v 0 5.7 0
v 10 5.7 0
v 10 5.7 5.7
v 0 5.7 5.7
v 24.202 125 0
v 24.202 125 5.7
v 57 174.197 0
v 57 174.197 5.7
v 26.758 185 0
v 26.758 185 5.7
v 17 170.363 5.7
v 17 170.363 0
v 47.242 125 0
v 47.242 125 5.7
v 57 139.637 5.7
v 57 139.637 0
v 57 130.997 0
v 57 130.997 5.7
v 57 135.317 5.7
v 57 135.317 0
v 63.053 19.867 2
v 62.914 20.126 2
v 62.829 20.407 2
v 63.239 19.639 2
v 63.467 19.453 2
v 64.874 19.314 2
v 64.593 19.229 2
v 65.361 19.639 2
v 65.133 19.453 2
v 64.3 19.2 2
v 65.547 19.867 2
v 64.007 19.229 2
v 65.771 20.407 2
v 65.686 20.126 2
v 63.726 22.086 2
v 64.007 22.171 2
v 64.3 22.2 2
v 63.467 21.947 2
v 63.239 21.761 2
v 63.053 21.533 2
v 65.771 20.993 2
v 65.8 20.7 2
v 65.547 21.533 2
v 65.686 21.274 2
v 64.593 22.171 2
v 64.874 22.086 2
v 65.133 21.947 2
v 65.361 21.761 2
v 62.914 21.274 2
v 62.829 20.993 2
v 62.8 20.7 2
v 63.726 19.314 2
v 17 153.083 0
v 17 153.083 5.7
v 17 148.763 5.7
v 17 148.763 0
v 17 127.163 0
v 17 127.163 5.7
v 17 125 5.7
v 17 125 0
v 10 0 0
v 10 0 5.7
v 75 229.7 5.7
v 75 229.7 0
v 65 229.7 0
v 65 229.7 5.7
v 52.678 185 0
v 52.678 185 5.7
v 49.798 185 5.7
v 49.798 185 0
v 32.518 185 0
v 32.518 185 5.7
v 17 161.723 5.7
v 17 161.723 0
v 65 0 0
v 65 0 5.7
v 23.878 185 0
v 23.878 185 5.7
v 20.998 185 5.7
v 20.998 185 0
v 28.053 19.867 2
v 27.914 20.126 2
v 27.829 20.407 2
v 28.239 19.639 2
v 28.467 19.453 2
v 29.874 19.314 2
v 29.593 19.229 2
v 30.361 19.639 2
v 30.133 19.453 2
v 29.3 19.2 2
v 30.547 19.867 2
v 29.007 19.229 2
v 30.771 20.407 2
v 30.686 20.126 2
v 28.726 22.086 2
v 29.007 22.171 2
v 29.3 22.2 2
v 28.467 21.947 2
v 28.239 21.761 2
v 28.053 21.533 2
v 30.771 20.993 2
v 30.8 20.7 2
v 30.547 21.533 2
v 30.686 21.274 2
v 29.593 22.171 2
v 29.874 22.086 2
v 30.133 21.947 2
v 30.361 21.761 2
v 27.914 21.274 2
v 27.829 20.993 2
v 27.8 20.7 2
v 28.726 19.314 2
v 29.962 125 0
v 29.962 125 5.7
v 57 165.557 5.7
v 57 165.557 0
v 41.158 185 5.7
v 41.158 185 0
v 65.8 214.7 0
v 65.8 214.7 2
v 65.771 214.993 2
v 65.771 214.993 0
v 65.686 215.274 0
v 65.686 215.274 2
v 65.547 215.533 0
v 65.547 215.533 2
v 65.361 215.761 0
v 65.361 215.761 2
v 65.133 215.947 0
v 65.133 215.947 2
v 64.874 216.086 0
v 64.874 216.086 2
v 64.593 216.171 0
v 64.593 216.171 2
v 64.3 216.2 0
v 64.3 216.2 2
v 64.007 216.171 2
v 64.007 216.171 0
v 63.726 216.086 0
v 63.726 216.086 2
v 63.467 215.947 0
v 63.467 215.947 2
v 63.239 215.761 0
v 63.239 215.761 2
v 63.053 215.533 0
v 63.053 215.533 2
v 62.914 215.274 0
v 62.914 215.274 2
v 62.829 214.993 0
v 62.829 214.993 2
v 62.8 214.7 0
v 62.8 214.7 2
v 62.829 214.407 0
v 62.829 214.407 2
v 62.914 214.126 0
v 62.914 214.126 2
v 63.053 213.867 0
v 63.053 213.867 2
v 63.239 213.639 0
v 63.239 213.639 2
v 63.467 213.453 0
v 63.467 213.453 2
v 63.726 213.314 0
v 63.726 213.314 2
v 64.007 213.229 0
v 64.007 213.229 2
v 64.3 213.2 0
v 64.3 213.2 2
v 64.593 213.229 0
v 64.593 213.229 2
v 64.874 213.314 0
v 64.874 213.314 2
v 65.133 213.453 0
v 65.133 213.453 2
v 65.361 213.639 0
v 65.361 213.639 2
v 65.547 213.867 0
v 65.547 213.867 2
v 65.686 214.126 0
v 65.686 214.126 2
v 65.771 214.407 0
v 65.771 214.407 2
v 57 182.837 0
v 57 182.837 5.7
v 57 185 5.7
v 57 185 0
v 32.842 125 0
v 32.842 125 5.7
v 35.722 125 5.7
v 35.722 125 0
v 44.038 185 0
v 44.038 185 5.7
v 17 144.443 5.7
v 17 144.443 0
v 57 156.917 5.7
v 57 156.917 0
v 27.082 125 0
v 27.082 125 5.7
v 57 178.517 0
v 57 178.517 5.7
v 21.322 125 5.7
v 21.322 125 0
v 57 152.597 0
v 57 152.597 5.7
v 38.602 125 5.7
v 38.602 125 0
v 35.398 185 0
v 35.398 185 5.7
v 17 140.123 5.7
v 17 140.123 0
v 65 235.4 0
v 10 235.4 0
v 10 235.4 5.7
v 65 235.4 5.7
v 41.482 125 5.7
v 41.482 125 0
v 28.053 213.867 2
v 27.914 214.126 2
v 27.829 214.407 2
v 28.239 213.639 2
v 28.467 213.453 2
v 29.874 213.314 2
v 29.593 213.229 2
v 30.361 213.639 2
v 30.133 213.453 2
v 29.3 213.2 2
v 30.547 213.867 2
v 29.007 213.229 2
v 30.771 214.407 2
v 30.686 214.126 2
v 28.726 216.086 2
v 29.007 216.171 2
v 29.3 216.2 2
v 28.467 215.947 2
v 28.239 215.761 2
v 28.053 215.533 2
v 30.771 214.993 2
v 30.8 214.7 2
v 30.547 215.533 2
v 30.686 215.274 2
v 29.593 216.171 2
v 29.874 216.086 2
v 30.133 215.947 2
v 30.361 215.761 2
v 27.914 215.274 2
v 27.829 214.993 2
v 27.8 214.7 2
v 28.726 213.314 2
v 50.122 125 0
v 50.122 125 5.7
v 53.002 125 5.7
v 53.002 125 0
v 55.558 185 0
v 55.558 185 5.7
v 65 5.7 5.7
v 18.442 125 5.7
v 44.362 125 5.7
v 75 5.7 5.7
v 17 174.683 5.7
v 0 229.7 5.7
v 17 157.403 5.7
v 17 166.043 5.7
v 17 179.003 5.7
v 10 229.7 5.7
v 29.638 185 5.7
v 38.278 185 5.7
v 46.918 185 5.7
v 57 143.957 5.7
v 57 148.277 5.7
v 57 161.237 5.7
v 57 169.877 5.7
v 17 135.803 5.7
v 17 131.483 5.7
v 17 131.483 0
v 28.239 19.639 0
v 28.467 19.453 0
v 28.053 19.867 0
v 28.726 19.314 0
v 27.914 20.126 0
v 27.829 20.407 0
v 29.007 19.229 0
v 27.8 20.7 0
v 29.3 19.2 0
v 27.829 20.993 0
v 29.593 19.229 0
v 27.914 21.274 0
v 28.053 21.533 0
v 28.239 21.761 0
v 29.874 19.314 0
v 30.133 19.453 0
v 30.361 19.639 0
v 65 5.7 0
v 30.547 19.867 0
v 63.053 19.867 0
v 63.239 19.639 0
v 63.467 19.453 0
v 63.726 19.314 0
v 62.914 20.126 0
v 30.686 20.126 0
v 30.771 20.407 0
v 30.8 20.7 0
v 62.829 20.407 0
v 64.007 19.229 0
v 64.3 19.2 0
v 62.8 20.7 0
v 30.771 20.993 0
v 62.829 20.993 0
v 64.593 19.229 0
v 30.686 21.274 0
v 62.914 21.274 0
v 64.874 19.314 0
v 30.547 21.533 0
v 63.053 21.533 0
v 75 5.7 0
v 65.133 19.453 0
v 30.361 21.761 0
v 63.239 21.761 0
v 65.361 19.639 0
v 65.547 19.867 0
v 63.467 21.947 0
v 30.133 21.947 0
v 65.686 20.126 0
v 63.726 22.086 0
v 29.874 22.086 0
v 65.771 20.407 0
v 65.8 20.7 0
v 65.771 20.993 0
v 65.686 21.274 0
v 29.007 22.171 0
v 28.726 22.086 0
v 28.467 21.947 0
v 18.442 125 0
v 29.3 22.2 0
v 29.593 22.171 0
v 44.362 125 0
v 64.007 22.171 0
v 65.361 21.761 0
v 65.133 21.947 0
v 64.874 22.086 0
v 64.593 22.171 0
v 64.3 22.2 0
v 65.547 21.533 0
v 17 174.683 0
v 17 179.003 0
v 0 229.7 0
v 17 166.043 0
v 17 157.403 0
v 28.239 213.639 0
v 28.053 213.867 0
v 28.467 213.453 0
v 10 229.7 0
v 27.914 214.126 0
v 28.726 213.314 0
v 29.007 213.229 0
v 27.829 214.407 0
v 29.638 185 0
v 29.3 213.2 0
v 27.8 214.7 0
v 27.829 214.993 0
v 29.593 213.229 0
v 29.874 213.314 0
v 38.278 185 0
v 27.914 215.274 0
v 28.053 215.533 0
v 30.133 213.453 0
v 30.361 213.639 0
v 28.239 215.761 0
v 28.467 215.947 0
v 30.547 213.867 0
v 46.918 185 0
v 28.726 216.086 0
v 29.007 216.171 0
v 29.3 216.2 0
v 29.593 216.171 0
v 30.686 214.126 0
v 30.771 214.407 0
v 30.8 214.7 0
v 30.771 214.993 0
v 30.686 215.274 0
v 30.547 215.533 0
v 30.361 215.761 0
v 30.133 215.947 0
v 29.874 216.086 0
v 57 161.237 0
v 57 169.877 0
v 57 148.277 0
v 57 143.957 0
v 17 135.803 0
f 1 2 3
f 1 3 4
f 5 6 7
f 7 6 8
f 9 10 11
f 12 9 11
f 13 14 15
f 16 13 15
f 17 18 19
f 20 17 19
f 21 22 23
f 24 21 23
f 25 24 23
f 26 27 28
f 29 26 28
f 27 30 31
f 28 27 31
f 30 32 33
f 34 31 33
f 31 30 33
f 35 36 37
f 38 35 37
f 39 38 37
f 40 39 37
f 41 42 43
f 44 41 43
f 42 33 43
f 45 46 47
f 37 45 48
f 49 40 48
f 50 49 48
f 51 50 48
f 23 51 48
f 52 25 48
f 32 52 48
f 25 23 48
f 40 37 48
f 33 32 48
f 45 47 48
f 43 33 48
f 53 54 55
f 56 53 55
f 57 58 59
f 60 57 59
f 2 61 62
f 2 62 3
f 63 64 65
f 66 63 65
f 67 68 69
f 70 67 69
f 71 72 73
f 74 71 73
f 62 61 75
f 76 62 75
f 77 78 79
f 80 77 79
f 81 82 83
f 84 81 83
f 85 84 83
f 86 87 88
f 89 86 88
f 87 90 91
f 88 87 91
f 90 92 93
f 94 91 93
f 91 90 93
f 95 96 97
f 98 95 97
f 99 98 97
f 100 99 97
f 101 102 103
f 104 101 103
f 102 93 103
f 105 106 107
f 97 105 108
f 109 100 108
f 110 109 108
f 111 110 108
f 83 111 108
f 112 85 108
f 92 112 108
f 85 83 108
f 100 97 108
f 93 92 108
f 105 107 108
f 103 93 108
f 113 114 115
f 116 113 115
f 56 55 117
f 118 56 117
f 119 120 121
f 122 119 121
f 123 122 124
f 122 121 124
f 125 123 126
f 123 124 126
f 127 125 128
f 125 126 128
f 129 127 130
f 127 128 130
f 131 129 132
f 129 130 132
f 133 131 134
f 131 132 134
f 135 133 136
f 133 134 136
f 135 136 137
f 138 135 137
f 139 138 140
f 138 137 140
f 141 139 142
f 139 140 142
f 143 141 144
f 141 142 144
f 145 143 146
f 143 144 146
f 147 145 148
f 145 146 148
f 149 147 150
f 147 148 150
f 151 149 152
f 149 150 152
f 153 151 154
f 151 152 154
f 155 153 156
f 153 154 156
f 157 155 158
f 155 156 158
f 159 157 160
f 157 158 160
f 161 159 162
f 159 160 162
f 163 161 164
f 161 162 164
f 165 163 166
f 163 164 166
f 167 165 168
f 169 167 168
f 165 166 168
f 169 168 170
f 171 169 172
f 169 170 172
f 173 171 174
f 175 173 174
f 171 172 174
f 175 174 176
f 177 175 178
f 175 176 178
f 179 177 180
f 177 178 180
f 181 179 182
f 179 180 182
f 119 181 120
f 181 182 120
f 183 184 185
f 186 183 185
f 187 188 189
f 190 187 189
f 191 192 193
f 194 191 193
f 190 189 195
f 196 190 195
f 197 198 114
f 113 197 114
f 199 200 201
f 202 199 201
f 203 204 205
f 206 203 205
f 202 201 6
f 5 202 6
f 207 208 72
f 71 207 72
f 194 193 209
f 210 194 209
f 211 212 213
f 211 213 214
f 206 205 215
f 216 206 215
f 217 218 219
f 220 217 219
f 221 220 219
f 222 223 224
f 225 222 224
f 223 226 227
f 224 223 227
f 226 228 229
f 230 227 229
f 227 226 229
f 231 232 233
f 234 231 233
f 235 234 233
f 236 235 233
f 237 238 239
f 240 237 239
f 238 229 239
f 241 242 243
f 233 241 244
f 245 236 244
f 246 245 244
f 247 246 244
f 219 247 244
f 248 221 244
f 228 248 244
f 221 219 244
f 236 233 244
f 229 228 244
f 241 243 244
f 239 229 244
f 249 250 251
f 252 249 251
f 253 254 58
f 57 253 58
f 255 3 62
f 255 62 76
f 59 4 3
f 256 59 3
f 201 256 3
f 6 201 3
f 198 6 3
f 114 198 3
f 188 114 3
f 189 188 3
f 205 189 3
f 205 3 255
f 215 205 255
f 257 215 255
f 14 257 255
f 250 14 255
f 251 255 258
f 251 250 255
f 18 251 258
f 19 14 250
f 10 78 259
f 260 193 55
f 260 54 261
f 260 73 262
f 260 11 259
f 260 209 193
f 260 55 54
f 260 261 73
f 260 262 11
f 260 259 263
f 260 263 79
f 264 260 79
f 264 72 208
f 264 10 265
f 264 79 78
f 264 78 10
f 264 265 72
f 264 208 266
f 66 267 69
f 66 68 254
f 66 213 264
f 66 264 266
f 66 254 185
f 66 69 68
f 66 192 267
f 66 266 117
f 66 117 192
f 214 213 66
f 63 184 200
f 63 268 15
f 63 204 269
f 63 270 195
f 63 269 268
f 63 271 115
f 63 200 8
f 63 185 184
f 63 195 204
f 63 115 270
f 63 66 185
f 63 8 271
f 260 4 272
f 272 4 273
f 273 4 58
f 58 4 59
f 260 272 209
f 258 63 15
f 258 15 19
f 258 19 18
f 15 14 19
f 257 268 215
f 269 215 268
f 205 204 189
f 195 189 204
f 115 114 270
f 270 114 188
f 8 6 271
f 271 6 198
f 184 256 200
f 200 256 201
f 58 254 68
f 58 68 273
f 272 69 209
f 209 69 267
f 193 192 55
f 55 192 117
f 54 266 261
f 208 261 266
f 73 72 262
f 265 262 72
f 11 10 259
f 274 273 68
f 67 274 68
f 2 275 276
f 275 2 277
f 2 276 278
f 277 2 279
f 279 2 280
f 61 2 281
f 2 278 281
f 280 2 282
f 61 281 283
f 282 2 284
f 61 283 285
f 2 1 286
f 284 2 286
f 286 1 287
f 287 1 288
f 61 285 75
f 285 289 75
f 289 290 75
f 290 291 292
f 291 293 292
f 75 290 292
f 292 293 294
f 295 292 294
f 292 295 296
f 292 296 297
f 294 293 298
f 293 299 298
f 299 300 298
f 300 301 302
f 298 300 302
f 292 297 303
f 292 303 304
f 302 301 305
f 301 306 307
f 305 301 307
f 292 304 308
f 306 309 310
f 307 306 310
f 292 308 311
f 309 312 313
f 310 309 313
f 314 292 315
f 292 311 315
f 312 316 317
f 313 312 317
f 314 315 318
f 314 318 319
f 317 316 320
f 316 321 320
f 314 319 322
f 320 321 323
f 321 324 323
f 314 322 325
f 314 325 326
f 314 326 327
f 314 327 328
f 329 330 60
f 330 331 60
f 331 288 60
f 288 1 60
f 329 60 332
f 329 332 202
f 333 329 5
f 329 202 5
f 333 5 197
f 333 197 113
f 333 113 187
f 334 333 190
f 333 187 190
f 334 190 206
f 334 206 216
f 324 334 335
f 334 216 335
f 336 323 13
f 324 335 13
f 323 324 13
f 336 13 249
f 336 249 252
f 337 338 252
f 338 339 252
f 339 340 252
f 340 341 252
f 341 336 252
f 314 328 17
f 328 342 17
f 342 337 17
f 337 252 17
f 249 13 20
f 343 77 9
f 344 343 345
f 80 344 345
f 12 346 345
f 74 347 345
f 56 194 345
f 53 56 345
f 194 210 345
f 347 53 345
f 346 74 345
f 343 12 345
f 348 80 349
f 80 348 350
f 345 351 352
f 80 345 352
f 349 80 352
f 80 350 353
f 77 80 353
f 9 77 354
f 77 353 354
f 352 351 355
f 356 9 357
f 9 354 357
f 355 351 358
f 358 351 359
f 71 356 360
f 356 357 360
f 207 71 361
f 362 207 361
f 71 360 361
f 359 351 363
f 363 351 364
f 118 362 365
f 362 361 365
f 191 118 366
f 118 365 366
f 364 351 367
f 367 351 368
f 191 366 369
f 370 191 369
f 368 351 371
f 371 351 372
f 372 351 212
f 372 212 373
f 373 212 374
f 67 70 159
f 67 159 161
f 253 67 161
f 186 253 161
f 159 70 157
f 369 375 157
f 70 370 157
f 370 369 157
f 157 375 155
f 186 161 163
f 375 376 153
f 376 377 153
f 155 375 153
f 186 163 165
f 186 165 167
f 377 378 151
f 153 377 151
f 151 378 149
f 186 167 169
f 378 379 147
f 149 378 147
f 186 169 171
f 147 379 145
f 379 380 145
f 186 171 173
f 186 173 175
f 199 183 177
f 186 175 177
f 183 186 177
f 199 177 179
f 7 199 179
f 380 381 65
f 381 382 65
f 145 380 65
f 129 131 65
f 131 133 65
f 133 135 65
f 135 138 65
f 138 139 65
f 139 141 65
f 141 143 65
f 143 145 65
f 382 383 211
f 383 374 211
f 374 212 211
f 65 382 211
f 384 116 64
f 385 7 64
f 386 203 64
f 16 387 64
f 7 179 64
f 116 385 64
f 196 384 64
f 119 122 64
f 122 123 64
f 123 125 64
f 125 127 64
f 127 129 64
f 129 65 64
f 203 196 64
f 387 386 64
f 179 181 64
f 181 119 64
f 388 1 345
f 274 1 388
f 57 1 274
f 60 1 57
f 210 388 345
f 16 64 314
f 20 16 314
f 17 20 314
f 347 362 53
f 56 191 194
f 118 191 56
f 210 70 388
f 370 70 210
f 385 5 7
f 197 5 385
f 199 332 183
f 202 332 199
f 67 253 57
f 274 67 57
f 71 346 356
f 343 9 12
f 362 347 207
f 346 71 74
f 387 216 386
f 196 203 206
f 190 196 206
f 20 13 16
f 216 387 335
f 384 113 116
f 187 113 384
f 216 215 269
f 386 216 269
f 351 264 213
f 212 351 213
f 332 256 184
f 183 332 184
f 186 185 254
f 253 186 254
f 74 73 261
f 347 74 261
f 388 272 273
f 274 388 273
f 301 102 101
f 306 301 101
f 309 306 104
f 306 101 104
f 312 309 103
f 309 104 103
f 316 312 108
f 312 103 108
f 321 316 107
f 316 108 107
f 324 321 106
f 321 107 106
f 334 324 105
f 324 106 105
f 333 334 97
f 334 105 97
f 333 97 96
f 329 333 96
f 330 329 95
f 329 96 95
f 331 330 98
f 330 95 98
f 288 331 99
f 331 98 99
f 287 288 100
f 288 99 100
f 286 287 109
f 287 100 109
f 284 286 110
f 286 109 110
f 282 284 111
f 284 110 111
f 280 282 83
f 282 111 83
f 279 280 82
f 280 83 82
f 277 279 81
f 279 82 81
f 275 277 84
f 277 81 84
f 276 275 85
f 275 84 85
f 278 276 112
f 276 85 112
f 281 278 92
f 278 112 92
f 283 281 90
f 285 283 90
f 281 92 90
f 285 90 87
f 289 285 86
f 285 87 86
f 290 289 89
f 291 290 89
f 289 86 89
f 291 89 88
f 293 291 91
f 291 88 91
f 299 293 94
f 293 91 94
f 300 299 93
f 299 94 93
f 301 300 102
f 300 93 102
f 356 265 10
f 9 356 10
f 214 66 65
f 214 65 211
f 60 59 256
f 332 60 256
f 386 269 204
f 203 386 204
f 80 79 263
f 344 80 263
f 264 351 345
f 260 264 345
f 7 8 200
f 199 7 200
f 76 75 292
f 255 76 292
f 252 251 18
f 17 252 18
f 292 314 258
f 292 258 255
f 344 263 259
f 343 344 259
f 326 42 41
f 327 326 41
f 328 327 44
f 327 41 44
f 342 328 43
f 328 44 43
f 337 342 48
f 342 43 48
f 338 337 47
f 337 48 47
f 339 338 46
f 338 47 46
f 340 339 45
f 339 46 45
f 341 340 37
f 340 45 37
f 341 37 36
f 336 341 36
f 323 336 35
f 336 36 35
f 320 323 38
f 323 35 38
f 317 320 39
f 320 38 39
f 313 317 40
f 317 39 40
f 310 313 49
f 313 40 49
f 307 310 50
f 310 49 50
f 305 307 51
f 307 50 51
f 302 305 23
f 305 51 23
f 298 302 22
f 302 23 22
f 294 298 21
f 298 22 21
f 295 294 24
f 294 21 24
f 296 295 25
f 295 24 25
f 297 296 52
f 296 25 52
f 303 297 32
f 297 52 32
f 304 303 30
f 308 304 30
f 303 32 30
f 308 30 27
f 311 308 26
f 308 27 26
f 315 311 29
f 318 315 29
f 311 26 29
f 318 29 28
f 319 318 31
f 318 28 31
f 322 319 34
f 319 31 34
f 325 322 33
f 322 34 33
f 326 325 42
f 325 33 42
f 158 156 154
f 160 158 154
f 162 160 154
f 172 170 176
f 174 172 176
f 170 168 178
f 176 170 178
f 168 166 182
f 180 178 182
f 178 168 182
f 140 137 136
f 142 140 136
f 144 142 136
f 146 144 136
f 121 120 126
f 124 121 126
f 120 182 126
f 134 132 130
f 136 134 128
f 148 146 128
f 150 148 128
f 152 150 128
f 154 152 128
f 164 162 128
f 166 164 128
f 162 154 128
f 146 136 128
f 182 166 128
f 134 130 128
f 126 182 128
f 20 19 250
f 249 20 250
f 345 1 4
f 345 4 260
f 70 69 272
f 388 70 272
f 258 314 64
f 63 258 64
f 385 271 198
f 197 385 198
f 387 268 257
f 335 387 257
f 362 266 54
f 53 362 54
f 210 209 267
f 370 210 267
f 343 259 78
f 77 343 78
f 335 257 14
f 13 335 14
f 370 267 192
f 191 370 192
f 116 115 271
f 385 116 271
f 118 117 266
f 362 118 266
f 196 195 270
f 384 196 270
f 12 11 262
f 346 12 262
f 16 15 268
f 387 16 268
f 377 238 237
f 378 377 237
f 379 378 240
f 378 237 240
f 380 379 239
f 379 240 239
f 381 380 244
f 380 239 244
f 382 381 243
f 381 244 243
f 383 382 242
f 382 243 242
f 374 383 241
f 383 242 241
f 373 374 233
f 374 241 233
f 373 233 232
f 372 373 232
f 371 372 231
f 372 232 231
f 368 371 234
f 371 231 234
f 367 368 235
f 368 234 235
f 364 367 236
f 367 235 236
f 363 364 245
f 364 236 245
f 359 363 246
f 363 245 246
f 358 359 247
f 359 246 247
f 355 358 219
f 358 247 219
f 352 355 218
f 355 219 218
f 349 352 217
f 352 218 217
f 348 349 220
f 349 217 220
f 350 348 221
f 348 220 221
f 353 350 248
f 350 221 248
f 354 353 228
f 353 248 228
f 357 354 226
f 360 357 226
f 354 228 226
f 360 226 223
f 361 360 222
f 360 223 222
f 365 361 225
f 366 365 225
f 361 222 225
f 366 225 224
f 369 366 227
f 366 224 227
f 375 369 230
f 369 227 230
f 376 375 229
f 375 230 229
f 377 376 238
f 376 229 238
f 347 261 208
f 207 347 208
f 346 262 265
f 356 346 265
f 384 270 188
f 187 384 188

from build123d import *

# Parameters (mm, degrees)
SKETCH1_W           = 75
SKETCH1_H           = 235.4
BOSS_EXTRUDE1_DEPTH = 5.7
SKETCH2_W           = 10
SKETCH2_H           = 5.7
CUT_EXTRUDE1_DEPTH  = 5.7
CUT_EXTRUDE2_DEPTH  = 5.7
CUT_EXTRUDE3_START  = -3.7
SKETCH4_R           = 1.5
CUT_EXTRUDE3_DEPTH  = 2


with BuildPart() as part:
    # Sketch1 → Boss-Extrude1 (new body)
    with BuildSketch(Plane.XY):
        with Locations((37.5, 117.7)):
            Rectangle(SKETCH1_W, SKETCH1_H)
    extrude(amount=BOSS_EXTRUDE1_DEPTH)

    # Sketch2 → Cut-Extrude1 (cut)
    with BuildSketch(Plane(origin=(0, 0, 0), x_dir=(-1, 0, 0), z_dir=(0, 0, -1))):
        with Locations((-70, 2.85)):
            Rectangle(SKETCH2_W, SKETCH2_H)
        with Locations((-5, 2.85)):
            Rectangle(SKETCH2_W, SKETCH2_H)
        with Locations((-5, 232.55)):
            Rectangle(SKETCH2_W, SKETCH2_H)
        with Locations((-70, 232.55)):
            Rectangle(SKETCH2_W, SKETCH2_H)
    extrude(amount=-CUT_EXTRUDE1_DEPTH, mode=Mode.SUBTRACT)

    # Sketch3 → Cut-Extrude2 (cut)
    with BuildSketch(Plane.XY.offset(5.7)):
        Polygon((57, 185), (55.55777949, 185), (17, 127.163330765), (17, 125), (18.44222051, 125), (57, 182.836669235), align=None)
        Polygon((52.67777949, 185), (49.79777949, 185), (17, 135.803330765), (17, 131.483330765), align=None)
        Polygon((46.91777949, 185), (44.03777949, 185), (17, 144.443330765), (17, 140.123330765), align=None)
        Polygon((41.15777949, 185), (38.27777949, 185), (17, 153.083330765), (17, 148.763330765), align=None)
        Polygon((35.39777949, 185), (32.51777949, 185), (17, 161.723330765), (17, 157.403330765), align=None)
        Polygon((29.63777949, 185), (26.75777949, 185), (17, 170.363330765), (17, 166.043330765), align=None)
        Polygon((23.87777949, 185), (20.99777949, 185), (17, 179.003330765), (17, 174.683330765), align=None)
        Polygon((57, 174.196669235), (57, 178.516669235), (21.32222051, 125), (24.20222051, 125), align=None)
        Polygon((57, 165.556669235), (57, 169.876669235), (27.08222051, 125), (29.96222051, 125), align=None)
        Polygon((57, 156.916669235), (57, 161.236669235), (32.84222051, 125), (35.72222051, 125), align=None)
        Polygon((57, 148.276669235), (57, 152.596669235), (38.60222051, 125), (41.48222051, 125), align=None)
        Polygon((57, 139.636669235), (57, 143.956669235), (44.36222051, 125), (47.24222051, 125), align=None)
        Polygon((57, 130.996669235), (57, 135.316669235), (50.12222051, 125), (53.00222051, 125), align=None)
    extrude(amount=-CUT_EXTRUDE2_DEPTH, mode=Mode.SUBTRACT)

    # Sketch4 → Cut-Extrude3 (cut)
    with BuildSketch(Plane.XY.offset(5.7).offset(CUT_EXTRUDE3_START)):
        with Locations((64.3, 20.7)):
            Circle(SKETCH4_R)
        with Locations((29.3, 20.7)):
            Circle(SKETCH4_R)
        with Locations((64.3, 214.7)):
            Circle(SKETCH4_R)
        with Locations((29.3, 214.7)):
            Circle(SKETCH4_R)
    extrude(amount=-CUT_EXTRUDE3_DEPTH, mode=Mode.SUBTRACT)


solid = part.part
